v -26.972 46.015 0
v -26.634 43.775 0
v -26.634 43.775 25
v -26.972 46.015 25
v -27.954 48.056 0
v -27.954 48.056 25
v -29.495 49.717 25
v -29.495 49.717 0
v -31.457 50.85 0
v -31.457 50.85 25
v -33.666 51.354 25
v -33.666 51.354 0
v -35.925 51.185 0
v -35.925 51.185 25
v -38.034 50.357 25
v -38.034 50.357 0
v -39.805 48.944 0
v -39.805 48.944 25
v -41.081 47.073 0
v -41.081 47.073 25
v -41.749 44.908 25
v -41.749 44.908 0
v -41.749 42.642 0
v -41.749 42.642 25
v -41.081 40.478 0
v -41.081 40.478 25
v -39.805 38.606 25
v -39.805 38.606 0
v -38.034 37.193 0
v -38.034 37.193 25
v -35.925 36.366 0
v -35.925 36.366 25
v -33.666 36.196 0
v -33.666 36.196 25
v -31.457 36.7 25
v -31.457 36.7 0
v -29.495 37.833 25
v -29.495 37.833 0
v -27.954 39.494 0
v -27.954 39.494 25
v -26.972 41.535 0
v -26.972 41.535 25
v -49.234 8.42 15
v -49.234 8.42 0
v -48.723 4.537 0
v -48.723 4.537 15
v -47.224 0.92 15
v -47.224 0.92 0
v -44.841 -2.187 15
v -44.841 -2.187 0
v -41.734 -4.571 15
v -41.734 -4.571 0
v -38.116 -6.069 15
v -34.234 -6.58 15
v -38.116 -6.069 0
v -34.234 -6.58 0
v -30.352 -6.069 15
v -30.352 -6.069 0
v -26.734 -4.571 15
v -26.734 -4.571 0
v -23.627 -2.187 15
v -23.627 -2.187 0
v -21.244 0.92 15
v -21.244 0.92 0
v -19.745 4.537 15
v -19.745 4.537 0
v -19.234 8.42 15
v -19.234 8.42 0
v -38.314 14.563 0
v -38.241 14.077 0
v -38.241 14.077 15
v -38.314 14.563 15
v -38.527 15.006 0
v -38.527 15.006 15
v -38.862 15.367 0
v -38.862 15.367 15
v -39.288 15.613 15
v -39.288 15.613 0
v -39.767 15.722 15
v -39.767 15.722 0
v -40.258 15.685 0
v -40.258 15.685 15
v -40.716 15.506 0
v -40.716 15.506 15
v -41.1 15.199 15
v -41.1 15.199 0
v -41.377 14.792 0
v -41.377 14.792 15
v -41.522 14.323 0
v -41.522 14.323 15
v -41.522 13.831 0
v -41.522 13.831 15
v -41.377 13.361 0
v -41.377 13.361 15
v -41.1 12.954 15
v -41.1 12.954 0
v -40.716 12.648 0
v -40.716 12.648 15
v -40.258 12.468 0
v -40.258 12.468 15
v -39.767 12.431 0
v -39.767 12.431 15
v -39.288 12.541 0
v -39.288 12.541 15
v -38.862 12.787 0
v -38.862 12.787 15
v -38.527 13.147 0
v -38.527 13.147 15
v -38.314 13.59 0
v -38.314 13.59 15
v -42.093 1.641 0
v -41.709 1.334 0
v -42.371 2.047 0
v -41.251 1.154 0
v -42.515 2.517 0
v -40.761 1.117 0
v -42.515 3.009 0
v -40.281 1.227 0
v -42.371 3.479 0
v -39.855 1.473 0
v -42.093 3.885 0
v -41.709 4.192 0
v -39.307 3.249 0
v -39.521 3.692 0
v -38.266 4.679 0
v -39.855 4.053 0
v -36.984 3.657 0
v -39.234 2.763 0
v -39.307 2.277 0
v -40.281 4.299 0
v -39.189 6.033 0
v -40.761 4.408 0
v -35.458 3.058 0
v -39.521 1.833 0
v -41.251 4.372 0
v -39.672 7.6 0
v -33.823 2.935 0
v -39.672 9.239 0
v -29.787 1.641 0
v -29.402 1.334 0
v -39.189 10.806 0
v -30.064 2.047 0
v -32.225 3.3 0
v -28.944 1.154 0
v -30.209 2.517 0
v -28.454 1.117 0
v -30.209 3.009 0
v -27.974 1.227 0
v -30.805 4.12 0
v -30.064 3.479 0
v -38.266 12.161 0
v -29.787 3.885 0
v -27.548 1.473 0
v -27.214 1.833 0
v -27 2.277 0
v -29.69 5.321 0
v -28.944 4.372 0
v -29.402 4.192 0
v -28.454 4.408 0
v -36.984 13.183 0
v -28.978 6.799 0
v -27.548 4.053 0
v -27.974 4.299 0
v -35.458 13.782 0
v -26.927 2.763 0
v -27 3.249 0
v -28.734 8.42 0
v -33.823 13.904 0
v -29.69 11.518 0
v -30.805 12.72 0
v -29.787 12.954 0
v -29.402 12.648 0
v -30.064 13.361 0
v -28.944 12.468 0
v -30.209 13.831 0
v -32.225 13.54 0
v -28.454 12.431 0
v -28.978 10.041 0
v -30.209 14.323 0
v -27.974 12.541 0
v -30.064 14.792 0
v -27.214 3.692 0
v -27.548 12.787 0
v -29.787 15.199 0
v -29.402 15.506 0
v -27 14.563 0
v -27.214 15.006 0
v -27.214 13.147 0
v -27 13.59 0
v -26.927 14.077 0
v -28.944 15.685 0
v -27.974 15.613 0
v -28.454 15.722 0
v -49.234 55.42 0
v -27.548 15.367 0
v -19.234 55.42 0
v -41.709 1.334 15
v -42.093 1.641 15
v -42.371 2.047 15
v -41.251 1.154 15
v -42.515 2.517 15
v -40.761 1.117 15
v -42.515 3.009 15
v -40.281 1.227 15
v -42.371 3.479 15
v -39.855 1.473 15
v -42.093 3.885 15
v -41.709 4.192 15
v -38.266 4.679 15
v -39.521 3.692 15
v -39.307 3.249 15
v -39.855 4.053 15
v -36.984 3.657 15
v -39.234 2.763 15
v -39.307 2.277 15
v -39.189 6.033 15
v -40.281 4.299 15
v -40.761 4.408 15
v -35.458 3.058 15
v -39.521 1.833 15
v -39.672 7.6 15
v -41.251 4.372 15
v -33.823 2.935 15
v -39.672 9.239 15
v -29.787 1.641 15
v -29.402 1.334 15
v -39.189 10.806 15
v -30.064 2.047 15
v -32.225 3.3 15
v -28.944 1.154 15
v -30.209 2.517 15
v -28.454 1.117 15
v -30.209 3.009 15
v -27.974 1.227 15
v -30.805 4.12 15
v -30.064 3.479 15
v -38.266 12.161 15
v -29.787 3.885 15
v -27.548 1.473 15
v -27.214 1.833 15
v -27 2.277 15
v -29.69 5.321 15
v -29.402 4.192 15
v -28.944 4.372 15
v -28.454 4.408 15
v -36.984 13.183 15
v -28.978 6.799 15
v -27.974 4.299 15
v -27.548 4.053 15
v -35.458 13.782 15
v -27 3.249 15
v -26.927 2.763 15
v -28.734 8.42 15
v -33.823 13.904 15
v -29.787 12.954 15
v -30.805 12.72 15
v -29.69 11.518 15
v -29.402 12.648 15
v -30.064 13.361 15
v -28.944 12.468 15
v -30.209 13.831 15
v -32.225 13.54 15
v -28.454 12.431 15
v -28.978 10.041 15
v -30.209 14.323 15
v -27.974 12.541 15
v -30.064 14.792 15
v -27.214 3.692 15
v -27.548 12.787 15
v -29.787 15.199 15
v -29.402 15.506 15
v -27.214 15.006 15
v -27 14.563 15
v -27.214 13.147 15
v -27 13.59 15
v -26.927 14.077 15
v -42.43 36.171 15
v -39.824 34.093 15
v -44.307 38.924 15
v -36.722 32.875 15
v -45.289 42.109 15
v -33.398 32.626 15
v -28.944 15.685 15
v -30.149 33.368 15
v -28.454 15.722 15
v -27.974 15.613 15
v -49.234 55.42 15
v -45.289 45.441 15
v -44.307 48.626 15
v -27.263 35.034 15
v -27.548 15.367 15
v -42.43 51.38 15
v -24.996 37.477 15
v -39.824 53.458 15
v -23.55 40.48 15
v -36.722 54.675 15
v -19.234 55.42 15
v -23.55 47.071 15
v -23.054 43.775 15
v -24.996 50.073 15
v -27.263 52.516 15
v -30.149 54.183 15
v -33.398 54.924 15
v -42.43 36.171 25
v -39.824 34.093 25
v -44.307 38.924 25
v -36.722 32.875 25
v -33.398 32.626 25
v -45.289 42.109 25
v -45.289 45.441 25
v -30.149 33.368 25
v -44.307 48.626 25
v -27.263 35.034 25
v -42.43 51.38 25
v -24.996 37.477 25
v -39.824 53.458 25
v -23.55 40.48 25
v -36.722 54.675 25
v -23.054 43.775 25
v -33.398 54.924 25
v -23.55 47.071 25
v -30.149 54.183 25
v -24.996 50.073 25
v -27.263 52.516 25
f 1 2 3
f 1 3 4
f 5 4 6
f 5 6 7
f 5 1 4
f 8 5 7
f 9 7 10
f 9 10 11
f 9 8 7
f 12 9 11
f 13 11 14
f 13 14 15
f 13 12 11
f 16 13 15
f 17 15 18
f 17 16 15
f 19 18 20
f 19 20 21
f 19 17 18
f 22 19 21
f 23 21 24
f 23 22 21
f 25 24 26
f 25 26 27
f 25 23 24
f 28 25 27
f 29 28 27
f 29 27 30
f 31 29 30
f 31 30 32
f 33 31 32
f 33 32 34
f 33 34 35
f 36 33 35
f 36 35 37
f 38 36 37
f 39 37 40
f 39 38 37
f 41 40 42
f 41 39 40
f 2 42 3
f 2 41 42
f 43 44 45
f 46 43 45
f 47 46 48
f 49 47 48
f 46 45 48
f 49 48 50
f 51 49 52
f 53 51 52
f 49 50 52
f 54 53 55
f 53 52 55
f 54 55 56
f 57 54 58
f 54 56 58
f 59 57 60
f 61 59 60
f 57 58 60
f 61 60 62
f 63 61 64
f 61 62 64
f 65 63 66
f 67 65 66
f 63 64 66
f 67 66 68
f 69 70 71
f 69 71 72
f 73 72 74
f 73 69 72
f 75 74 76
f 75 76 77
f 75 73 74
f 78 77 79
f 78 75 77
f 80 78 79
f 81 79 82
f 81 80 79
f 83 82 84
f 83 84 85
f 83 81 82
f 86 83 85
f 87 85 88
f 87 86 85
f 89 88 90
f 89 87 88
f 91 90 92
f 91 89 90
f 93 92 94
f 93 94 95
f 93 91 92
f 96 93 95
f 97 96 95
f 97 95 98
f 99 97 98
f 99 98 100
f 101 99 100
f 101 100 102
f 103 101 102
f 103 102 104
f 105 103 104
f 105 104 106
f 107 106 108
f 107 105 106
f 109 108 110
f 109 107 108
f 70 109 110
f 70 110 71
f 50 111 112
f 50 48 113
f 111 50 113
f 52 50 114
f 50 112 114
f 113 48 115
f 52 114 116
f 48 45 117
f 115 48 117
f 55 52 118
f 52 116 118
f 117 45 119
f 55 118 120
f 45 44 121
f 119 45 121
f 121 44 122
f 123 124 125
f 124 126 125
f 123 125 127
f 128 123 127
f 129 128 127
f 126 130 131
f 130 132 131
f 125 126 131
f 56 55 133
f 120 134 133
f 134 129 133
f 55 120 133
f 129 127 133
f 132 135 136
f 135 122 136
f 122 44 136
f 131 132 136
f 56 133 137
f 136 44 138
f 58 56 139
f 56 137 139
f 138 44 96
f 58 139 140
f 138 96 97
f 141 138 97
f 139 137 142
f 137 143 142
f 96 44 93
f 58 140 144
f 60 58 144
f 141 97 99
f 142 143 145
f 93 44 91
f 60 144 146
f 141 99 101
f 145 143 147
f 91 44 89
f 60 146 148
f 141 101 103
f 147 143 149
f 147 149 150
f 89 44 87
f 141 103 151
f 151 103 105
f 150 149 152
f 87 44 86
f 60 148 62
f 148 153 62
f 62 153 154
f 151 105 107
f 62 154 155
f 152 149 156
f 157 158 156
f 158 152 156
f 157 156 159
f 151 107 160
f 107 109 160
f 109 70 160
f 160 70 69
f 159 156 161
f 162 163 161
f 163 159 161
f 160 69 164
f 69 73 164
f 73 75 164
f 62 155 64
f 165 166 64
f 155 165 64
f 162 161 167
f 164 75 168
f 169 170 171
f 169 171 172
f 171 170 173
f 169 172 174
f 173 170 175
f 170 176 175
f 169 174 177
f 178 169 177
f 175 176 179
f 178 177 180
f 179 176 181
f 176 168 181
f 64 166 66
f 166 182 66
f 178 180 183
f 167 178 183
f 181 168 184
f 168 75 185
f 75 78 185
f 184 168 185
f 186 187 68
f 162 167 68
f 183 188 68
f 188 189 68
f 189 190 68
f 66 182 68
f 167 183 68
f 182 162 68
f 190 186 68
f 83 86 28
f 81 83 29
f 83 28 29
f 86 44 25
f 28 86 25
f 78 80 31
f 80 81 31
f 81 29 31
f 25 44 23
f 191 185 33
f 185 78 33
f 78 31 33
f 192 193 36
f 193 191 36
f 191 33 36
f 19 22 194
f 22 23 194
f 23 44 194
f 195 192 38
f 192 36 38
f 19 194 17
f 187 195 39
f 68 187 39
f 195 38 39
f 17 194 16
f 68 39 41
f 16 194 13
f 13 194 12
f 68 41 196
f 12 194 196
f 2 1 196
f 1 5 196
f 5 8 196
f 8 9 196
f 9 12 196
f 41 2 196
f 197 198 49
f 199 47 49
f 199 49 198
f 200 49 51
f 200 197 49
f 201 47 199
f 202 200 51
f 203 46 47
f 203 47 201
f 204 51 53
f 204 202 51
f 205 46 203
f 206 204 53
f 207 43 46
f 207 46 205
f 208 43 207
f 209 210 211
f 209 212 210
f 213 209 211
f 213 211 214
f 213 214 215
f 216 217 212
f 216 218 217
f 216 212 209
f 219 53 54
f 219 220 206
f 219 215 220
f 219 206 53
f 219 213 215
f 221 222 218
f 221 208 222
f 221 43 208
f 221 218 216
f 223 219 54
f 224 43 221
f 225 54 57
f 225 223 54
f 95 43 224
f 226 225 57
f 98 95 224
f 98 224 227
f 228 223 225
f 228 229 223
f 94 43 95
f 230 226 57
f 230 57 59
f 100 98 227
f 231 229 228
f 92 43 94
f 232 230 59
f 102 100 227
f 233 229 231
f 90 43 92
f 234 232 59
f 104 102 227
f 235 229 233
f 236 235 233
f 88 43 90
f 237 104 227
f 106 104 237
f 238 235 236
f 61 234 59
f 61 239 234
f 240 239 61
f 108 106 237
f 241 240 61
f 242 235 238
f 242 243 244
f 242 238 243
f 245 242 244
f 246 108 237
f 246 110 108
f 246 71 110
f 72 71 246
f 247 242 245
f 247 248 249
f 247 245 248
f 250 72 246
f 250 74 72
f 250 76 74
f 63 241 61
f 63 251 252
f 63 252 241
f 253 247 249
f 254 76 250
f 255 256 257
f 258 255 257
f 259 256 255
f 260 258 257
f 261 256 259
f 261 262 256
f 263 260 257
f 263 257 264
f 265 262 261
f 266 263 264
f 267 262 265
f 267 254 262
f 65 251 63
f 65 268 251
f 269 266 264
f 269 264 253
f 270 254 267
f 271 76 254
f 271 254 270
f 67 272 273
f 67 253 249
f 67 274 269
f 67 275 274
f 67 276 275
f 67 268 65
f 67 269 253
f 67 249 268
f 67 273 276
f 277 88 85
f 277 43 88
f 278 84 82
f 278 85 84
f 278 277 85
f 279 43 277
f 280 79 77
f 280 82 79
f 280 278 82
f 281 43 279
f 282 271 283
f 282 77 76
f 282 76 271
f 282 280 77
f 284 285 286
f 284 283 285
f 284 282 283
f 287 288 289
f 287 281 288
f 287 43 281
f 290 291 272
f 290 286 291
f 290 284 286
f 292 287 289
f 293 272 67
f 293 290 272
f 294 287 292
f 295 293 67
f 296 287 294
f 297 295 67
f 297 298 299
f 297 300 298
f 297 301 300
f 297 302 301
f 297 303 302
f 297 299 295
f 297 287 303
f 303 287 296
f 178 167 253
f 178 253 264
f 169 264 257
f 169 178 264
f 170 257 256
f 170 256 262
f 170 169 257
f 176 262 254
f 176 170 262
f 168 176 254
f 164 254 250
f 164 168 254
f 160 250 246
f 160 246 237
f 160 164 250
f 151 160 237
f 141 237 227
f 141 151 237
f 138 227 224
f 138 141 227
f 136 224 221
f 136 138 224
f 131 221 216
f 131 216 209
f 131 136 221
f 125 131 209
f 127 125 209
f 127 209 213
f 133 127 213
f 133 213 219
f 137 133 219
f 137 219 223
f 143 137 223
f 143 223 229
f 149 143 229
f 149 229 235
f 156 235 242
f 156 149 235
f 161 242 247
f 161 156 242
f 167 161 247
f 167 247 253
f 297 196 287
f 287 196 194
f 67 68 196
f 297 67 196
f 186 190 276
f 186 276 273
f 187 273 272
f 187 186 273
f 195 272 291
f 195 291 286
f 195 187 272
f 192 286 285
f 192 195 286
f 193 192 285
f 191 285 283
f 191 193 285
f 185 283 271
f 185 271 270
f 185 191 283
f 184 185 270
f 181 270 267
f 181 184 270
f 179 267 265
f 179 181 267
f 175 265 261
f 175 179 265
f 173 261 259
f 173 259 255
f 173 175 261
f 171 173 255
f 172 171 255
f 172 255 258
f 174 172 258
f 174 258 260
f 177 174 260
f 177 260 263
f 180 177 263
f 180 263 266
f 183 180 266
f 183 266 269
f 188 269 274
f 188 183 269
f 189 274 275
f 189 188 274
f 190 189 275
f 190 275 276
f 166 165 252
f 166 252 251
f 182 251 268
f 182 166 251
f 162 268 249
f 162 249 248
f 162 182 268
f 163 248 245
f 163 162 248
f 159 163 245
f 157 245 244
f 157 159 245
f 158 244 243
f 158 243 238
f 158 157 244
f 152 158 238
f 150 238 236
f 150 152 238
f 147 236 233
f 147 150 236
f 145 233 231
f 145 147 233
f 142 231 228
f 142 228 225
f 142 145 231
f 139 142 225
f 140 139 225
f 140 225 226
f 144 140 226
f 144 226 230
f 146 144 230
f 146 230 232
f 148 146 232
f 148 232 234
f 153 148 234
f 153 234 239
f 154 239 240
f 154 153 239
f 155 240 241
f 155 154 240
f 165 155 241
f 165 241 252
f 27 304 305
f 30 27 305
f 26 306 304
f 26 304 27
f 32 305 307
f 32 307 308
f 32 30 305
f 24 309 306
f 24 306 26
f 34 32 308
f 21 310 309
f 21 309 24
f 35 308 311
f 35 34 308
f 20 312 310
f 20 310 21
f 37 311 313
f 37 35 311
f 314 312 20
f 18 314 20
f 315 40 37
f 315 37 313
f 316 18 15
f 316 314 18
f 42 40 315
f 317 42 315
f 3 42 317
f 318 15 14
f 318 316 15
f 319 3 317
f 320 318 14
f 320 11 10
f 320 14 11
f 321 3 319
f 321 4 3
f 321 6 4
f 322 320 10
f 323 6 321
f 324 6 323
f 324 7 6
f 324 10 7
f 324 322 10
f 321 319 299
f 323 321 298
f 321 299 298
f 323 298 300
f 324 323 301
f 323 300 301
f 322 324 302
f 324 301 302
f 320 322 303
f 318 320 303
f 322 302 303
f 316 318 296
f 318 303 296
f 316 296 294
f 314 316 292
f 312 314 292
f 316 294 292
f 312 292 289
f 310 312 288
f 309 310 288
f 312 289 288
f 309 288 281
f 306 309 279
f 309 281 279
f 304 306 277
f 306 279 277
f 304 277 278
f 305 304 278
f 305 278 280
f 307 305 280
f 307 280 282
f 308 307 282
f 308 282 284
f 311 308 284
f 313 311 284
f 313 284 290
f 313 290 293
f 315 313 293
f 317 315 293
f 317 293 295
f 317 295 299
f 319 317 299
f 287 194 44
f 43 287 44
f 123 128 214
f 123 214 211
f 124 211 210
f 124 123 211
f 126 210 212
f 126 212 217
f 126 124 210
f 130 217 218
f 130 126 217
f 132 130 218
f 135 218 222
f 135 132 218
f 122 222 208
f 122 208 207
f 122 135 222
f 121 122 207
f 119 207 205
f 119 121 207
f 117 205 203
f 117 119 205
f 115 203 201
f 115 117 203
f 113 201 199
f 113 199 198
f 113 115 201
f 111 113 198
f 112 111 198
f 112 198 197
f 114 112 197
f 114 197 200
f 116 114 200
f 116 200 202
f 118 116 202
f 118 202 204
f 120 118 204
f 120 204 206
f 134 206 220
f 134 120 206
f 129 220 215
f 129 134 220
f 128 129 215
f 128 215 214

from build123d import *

# Parameters (mm, degrees)
F0_R     = 1.65
F0_R_2   = 5.5
F0_R_3   = 11.1803398875
F1_DEPTH = 15
F0_R_4   = 7.6
F2_DEPTH = 25


# Not quite as in the source:
# - a feature names something its author has since deleted; it is built from what else it names


with BuildPart() as f1:
    # F0 (on Top) → F1 (new body)
    with BuildSketch(Plane.XY):
        with BuildLine():
            Line((-19.2339122487, 8.4197289313), (-19.2339122487, 53.7750689313))
            Line((-19.2339122487, 53.7750689313), (-19.2339122487, 55.4197289313))
            Line((-19.2339122487, 55.4197289313), (-49.2339122487, 55.4197289313))
            Line((-49.2339122487, 55.4197289313), (-49.2339122487, 8.4197289313))
            ThreePointArc((-49.2339122487, 8.4197289313), (-34.2339122487, -6.5802710687), (-19.2339122487, 8.4197289313))
        make_face()
        with Locations((-40.8839122487, 2.7628746818)):
            Circle(F0_R, mode=Mode.SUBTRACT)
        with Locations((-39.8907664982, 14.0765831808)):
            Circle(F0_R, mode=Mode.SUBTRACT)
        with Locations((-34.2339122487, 8.4197289313)):
            Circle(F0_R_2, mode=Mode.SUBTRACT)
        with Locations((-28.5770579992, 2.7628746818)):
            Circle(F0_R, mode=Mode.SUBTRACT)
        with Locations((-28.5770579992, 14.0765831808)):
            Circle(F0_R, mode=Mode.SUBTRACT)
        with Locations((-34.2339122487, 43.7750689313)):
            Circle(F0_R_3, mode=Mode.SUBTRACT)
    extrude(amount=F1_DEPTH)

    # F0 (on Top) → F2 (join)
    with BuildSketch(Plane.XY):
        with Locations((-34.2339122487, 43.7750689313)):
            Circle(F0_R_3)
        with Locations((-34.2339122487, 43.7750689313)):
            Circle(F0_R_4, mode=Mode.SUBTRACT)
    extrude(amount=F2_DEPTH)


solid = f1.part
